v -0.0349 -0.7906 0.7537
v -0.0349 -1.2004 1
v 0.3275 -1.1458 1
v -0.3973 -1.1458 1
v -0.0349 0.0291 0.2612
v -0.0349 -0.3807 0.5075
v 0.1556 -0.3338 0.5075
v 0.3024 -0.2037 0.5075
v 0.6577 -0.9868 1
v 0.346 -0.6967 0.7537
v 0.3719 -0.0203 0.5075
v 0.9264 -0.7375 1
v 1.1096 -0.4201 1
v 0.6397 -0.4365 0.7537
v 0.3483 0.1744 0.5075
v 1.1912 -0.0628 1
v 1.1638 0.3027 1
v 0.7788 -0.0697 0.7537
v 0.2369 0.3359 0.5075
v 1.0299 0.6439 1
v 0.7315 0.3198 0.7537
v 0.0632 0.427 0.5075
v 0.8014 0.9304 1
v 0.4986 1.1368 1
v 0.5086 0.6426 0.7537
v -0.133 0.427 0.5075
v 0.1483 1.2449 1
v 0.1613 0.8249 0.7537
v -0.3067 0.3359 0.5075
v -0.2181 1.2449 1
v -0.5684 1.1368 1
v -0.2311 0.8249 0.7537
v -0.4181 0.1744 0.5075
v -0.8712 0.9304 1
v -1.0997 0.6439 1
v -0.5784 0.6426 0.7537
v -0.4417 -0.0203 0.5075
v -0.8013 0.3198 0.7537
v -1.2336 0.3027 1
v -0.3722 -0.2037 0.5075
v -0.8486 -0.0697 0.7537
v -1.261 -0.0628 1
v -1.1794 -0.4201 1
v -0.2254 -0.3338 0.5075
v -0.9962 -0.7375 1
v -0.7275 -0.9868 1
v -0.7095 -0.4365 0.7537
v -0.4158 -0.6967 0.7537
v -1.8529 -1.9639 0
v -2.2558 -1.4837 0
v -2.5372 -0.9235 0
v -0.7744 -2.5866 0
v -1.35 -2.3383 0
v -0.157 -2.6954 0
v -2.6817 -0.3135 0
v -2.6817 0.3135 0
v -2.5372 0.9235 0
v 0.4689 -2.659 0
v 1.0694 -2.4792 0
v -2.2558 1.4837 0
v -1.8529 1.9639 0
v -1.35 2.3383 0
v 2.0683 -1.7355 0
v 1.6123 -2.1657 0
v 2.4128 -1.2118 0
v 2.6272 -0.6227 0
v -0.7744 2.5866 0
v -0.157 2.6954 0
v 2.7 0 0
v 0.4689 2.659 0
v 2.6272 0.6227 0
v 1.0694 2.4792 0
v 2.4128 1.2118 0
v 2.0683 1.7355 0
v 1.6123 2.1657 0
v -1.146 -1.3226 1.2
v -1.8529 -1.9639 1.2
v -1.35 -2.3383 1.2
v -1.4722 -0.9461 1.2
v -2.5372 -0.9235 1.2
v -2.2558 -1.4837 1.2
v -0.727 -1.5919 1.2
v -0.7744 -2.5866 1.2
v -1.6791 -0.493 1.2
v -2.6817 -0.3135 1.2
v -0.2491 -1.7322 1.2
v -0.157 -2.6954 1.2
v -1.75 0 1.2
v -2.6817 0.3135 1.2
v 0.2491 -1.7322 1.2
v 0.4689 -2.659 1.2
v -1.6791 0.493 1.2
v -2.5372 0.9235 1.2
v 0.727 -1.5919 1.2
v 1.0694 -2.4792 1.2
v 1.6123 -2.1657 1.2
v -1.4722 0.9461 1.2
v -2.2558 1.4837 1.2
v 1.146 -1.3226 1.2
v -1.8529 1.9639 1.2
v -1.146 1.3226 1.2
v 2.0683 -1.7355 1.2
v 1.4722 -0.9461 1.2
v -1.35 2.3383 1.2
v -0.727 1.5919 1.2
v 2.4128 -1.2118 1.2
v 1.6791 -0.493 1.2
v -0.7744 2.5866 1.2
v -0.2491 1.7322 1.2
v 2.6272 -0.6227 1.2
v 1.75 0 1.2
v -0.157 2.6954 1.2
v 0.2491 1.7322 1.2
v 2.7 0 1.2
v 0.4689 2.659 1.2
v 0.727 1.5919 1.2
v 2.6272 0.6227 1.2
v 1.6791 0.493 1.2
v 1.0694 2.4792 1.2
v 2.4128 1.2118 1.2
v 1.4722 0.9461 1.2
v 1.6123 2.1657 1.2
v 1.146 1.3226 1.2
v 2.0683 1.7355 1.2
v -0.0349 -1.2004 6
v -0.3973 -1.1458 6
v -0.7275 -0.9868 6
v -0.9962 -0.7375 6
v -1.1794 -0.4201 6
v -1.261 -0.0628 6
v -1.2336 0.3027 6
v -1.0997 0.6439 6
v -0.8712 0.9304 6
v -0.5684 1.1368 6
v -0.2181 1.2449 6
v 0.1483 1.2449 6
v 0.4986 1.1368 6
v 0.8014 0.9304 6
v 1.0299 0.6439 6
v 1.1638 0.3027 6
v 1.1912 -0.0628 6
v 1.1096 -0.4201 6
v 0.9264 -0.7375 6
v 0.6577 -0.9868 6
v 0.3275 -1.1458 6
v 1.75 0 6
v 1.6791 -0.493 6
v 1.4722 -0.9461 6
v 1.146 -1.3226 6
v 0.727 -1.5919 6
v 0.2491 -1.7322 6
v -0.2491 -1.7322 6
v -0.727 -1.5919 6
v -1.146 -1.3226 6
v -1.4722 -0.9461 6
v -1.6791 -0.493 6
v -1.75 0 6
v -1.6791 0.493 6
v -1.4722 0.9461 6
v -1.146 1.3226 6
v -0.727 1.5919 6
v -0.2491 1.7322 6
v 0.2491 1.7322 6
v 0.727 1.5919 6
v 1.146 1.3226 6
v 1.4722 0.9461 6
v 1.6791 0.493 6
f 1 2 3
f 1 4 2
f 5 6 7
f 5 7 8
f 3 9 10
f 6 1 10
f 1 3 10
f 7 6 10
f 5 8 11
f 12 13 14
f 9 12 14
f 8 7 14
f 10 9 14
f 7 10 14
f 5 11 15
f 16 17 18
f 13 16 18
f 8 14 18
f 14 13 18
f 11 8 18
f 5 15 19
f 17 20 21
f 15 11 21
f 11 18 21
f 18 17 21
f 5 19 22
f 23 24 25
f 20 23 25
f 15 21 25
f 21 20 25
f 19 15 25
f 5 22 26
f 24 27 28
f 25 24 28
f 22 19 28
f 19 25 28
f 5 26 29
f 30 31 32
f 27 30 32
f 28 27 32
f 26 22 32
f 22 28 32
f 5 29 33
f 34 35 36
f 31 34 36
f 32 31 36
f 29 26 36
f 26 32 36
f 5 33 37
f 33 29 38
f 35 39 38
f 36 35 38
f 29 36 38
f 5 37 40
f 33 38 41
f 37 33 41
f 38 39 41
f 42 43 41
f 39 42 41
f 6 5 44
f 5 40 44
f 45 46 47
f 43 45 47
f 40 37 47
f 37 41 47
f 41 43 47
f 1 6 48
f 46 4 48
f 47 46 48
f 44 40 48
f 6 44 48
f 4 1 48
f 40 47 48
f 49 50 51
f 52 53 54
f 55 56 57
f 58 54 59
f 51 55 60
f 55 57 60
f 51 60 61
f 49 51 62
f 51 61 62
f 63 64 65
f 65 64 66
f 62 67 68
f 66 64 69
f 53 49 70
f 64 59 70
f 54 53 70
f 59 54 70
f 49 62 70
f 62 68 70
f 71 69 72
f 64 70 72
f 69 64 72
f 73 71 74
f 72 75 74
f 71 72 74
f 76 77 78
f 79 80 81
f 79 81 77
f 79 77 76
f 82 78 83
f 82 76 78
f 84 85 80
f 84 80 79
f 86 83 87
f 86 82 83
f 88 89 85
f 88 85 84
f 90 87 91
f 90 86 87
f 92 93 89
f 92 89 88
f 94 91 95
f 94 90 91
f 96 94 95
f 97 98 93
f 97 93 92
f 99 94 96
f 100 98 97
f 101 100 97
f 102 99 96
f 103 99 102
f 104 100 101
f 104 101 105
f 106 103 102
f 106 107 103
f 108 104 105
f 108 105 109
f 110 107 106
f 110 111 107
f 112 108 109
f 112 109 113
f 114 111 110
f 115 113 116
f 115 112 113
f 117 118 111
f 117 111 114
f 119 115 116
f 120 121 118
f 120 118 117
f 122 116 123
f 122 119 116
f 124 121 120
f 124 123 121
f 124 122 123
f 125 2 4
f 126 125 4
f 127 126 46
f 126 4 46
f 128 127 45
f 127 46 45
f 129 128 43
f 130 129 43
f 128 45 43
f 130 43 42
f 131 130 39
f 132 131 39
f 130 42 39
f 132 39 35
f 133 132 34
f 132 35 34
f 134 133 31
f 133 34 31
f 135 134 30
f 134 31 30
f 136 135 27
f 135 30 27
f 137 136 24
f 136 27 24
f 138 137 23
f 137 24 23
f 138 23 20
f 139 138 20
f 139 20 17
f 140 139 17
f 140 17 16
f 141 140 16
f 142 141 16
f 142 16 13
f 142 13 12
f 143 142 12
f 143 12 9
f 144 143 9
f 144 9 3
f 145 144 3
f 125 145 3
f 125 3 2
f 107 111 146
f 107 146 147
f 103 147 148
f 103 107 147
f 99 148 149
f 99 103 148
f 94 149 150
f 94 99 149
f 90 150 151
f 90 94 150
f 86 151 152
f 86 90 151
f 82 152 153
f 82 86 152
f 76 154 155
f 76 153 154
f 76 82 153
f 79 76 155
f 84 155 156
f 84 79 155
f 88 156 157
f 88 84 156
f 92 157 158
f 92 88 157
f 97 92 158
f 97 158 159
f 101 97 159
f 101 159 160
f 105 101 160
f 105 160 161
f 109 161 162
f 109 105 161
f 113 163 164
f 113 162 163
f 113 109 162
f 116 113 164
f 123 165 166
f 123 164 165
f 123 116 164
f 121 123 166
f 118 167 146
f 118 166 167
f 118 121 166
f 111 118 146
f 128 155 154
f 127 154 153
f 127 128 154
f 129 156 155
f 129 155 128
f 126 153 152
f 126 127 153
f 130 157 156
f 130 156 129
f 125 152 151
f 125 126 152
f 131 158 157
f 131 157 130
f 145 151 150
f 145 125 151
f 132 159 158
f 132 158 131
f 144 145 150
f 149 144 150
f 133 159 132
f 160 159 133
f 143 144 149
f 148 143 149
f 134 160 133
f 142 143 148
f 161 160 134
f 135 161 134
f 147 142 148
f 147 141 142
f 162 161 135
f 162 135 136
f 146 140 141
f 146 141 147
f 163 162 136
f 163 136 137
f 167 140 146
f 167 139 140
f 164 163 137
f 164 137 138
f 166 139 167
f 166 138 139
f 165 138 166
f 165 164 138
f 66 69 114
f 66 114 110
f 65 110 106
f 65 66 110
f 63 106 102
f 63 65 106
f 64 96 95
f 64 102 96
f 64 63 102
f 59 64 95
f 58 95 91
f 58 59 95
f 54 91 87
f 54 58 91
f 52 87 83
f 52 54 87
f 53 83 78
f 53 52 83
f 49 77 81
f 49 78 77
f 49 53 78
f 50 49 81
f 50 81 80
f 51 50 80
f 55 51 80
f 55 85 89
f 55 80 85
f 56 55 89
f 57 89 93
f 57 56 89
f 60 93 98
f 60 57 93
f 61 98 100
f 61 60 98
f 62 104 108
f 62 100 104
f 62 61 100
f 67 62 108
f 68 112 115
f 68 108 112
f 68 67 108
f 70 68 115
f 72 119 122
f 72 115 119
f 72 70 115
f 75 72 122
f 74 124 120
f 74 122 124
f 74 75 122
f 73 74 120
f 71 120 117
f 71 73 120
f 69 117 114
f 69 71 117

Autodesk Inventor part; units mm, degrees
ref_plane "YZ Plane" through (0, 0, 0) normal (1, 0, 0) x (0, 1, 0)
ref_plane "XZ Plane" through (0, 0, 0) normal (0, 1, 0) x (-1, 0, 0)
ref_plane "XY Plane" through (0, 0, 0) normal (0, 0, 1) x (1, 0, 0)
sketch "스케치1" plane through (0, 0, 0) normal (0, 0, 1) x (1, 0, 0)
  circle A0 centre (0, 0) radius 2.7
  dimension "d0" = 5.4
extrude "돌출1" add sketch "스케치1" along normal blind 1.2
sketch "스케치2" plane through (0, 0, 1.2) normal (0, 0, 1) x (1, 0, 0)
  circle A0 centre (0, 0) radius 1.75
  dimension "d3" = 3.5
extrude "돌출2" add sketch "스케치2" along normal blind 4.8
hole "구멍1" at (-0.0349, 0.0291, 6) direction (0, 0, -1) diameter 2.459 depth 5 tip angle 118 thread size "M3x0.5" class "6H" standard "ISO Metric profile"
properties part number "240621_나사"
